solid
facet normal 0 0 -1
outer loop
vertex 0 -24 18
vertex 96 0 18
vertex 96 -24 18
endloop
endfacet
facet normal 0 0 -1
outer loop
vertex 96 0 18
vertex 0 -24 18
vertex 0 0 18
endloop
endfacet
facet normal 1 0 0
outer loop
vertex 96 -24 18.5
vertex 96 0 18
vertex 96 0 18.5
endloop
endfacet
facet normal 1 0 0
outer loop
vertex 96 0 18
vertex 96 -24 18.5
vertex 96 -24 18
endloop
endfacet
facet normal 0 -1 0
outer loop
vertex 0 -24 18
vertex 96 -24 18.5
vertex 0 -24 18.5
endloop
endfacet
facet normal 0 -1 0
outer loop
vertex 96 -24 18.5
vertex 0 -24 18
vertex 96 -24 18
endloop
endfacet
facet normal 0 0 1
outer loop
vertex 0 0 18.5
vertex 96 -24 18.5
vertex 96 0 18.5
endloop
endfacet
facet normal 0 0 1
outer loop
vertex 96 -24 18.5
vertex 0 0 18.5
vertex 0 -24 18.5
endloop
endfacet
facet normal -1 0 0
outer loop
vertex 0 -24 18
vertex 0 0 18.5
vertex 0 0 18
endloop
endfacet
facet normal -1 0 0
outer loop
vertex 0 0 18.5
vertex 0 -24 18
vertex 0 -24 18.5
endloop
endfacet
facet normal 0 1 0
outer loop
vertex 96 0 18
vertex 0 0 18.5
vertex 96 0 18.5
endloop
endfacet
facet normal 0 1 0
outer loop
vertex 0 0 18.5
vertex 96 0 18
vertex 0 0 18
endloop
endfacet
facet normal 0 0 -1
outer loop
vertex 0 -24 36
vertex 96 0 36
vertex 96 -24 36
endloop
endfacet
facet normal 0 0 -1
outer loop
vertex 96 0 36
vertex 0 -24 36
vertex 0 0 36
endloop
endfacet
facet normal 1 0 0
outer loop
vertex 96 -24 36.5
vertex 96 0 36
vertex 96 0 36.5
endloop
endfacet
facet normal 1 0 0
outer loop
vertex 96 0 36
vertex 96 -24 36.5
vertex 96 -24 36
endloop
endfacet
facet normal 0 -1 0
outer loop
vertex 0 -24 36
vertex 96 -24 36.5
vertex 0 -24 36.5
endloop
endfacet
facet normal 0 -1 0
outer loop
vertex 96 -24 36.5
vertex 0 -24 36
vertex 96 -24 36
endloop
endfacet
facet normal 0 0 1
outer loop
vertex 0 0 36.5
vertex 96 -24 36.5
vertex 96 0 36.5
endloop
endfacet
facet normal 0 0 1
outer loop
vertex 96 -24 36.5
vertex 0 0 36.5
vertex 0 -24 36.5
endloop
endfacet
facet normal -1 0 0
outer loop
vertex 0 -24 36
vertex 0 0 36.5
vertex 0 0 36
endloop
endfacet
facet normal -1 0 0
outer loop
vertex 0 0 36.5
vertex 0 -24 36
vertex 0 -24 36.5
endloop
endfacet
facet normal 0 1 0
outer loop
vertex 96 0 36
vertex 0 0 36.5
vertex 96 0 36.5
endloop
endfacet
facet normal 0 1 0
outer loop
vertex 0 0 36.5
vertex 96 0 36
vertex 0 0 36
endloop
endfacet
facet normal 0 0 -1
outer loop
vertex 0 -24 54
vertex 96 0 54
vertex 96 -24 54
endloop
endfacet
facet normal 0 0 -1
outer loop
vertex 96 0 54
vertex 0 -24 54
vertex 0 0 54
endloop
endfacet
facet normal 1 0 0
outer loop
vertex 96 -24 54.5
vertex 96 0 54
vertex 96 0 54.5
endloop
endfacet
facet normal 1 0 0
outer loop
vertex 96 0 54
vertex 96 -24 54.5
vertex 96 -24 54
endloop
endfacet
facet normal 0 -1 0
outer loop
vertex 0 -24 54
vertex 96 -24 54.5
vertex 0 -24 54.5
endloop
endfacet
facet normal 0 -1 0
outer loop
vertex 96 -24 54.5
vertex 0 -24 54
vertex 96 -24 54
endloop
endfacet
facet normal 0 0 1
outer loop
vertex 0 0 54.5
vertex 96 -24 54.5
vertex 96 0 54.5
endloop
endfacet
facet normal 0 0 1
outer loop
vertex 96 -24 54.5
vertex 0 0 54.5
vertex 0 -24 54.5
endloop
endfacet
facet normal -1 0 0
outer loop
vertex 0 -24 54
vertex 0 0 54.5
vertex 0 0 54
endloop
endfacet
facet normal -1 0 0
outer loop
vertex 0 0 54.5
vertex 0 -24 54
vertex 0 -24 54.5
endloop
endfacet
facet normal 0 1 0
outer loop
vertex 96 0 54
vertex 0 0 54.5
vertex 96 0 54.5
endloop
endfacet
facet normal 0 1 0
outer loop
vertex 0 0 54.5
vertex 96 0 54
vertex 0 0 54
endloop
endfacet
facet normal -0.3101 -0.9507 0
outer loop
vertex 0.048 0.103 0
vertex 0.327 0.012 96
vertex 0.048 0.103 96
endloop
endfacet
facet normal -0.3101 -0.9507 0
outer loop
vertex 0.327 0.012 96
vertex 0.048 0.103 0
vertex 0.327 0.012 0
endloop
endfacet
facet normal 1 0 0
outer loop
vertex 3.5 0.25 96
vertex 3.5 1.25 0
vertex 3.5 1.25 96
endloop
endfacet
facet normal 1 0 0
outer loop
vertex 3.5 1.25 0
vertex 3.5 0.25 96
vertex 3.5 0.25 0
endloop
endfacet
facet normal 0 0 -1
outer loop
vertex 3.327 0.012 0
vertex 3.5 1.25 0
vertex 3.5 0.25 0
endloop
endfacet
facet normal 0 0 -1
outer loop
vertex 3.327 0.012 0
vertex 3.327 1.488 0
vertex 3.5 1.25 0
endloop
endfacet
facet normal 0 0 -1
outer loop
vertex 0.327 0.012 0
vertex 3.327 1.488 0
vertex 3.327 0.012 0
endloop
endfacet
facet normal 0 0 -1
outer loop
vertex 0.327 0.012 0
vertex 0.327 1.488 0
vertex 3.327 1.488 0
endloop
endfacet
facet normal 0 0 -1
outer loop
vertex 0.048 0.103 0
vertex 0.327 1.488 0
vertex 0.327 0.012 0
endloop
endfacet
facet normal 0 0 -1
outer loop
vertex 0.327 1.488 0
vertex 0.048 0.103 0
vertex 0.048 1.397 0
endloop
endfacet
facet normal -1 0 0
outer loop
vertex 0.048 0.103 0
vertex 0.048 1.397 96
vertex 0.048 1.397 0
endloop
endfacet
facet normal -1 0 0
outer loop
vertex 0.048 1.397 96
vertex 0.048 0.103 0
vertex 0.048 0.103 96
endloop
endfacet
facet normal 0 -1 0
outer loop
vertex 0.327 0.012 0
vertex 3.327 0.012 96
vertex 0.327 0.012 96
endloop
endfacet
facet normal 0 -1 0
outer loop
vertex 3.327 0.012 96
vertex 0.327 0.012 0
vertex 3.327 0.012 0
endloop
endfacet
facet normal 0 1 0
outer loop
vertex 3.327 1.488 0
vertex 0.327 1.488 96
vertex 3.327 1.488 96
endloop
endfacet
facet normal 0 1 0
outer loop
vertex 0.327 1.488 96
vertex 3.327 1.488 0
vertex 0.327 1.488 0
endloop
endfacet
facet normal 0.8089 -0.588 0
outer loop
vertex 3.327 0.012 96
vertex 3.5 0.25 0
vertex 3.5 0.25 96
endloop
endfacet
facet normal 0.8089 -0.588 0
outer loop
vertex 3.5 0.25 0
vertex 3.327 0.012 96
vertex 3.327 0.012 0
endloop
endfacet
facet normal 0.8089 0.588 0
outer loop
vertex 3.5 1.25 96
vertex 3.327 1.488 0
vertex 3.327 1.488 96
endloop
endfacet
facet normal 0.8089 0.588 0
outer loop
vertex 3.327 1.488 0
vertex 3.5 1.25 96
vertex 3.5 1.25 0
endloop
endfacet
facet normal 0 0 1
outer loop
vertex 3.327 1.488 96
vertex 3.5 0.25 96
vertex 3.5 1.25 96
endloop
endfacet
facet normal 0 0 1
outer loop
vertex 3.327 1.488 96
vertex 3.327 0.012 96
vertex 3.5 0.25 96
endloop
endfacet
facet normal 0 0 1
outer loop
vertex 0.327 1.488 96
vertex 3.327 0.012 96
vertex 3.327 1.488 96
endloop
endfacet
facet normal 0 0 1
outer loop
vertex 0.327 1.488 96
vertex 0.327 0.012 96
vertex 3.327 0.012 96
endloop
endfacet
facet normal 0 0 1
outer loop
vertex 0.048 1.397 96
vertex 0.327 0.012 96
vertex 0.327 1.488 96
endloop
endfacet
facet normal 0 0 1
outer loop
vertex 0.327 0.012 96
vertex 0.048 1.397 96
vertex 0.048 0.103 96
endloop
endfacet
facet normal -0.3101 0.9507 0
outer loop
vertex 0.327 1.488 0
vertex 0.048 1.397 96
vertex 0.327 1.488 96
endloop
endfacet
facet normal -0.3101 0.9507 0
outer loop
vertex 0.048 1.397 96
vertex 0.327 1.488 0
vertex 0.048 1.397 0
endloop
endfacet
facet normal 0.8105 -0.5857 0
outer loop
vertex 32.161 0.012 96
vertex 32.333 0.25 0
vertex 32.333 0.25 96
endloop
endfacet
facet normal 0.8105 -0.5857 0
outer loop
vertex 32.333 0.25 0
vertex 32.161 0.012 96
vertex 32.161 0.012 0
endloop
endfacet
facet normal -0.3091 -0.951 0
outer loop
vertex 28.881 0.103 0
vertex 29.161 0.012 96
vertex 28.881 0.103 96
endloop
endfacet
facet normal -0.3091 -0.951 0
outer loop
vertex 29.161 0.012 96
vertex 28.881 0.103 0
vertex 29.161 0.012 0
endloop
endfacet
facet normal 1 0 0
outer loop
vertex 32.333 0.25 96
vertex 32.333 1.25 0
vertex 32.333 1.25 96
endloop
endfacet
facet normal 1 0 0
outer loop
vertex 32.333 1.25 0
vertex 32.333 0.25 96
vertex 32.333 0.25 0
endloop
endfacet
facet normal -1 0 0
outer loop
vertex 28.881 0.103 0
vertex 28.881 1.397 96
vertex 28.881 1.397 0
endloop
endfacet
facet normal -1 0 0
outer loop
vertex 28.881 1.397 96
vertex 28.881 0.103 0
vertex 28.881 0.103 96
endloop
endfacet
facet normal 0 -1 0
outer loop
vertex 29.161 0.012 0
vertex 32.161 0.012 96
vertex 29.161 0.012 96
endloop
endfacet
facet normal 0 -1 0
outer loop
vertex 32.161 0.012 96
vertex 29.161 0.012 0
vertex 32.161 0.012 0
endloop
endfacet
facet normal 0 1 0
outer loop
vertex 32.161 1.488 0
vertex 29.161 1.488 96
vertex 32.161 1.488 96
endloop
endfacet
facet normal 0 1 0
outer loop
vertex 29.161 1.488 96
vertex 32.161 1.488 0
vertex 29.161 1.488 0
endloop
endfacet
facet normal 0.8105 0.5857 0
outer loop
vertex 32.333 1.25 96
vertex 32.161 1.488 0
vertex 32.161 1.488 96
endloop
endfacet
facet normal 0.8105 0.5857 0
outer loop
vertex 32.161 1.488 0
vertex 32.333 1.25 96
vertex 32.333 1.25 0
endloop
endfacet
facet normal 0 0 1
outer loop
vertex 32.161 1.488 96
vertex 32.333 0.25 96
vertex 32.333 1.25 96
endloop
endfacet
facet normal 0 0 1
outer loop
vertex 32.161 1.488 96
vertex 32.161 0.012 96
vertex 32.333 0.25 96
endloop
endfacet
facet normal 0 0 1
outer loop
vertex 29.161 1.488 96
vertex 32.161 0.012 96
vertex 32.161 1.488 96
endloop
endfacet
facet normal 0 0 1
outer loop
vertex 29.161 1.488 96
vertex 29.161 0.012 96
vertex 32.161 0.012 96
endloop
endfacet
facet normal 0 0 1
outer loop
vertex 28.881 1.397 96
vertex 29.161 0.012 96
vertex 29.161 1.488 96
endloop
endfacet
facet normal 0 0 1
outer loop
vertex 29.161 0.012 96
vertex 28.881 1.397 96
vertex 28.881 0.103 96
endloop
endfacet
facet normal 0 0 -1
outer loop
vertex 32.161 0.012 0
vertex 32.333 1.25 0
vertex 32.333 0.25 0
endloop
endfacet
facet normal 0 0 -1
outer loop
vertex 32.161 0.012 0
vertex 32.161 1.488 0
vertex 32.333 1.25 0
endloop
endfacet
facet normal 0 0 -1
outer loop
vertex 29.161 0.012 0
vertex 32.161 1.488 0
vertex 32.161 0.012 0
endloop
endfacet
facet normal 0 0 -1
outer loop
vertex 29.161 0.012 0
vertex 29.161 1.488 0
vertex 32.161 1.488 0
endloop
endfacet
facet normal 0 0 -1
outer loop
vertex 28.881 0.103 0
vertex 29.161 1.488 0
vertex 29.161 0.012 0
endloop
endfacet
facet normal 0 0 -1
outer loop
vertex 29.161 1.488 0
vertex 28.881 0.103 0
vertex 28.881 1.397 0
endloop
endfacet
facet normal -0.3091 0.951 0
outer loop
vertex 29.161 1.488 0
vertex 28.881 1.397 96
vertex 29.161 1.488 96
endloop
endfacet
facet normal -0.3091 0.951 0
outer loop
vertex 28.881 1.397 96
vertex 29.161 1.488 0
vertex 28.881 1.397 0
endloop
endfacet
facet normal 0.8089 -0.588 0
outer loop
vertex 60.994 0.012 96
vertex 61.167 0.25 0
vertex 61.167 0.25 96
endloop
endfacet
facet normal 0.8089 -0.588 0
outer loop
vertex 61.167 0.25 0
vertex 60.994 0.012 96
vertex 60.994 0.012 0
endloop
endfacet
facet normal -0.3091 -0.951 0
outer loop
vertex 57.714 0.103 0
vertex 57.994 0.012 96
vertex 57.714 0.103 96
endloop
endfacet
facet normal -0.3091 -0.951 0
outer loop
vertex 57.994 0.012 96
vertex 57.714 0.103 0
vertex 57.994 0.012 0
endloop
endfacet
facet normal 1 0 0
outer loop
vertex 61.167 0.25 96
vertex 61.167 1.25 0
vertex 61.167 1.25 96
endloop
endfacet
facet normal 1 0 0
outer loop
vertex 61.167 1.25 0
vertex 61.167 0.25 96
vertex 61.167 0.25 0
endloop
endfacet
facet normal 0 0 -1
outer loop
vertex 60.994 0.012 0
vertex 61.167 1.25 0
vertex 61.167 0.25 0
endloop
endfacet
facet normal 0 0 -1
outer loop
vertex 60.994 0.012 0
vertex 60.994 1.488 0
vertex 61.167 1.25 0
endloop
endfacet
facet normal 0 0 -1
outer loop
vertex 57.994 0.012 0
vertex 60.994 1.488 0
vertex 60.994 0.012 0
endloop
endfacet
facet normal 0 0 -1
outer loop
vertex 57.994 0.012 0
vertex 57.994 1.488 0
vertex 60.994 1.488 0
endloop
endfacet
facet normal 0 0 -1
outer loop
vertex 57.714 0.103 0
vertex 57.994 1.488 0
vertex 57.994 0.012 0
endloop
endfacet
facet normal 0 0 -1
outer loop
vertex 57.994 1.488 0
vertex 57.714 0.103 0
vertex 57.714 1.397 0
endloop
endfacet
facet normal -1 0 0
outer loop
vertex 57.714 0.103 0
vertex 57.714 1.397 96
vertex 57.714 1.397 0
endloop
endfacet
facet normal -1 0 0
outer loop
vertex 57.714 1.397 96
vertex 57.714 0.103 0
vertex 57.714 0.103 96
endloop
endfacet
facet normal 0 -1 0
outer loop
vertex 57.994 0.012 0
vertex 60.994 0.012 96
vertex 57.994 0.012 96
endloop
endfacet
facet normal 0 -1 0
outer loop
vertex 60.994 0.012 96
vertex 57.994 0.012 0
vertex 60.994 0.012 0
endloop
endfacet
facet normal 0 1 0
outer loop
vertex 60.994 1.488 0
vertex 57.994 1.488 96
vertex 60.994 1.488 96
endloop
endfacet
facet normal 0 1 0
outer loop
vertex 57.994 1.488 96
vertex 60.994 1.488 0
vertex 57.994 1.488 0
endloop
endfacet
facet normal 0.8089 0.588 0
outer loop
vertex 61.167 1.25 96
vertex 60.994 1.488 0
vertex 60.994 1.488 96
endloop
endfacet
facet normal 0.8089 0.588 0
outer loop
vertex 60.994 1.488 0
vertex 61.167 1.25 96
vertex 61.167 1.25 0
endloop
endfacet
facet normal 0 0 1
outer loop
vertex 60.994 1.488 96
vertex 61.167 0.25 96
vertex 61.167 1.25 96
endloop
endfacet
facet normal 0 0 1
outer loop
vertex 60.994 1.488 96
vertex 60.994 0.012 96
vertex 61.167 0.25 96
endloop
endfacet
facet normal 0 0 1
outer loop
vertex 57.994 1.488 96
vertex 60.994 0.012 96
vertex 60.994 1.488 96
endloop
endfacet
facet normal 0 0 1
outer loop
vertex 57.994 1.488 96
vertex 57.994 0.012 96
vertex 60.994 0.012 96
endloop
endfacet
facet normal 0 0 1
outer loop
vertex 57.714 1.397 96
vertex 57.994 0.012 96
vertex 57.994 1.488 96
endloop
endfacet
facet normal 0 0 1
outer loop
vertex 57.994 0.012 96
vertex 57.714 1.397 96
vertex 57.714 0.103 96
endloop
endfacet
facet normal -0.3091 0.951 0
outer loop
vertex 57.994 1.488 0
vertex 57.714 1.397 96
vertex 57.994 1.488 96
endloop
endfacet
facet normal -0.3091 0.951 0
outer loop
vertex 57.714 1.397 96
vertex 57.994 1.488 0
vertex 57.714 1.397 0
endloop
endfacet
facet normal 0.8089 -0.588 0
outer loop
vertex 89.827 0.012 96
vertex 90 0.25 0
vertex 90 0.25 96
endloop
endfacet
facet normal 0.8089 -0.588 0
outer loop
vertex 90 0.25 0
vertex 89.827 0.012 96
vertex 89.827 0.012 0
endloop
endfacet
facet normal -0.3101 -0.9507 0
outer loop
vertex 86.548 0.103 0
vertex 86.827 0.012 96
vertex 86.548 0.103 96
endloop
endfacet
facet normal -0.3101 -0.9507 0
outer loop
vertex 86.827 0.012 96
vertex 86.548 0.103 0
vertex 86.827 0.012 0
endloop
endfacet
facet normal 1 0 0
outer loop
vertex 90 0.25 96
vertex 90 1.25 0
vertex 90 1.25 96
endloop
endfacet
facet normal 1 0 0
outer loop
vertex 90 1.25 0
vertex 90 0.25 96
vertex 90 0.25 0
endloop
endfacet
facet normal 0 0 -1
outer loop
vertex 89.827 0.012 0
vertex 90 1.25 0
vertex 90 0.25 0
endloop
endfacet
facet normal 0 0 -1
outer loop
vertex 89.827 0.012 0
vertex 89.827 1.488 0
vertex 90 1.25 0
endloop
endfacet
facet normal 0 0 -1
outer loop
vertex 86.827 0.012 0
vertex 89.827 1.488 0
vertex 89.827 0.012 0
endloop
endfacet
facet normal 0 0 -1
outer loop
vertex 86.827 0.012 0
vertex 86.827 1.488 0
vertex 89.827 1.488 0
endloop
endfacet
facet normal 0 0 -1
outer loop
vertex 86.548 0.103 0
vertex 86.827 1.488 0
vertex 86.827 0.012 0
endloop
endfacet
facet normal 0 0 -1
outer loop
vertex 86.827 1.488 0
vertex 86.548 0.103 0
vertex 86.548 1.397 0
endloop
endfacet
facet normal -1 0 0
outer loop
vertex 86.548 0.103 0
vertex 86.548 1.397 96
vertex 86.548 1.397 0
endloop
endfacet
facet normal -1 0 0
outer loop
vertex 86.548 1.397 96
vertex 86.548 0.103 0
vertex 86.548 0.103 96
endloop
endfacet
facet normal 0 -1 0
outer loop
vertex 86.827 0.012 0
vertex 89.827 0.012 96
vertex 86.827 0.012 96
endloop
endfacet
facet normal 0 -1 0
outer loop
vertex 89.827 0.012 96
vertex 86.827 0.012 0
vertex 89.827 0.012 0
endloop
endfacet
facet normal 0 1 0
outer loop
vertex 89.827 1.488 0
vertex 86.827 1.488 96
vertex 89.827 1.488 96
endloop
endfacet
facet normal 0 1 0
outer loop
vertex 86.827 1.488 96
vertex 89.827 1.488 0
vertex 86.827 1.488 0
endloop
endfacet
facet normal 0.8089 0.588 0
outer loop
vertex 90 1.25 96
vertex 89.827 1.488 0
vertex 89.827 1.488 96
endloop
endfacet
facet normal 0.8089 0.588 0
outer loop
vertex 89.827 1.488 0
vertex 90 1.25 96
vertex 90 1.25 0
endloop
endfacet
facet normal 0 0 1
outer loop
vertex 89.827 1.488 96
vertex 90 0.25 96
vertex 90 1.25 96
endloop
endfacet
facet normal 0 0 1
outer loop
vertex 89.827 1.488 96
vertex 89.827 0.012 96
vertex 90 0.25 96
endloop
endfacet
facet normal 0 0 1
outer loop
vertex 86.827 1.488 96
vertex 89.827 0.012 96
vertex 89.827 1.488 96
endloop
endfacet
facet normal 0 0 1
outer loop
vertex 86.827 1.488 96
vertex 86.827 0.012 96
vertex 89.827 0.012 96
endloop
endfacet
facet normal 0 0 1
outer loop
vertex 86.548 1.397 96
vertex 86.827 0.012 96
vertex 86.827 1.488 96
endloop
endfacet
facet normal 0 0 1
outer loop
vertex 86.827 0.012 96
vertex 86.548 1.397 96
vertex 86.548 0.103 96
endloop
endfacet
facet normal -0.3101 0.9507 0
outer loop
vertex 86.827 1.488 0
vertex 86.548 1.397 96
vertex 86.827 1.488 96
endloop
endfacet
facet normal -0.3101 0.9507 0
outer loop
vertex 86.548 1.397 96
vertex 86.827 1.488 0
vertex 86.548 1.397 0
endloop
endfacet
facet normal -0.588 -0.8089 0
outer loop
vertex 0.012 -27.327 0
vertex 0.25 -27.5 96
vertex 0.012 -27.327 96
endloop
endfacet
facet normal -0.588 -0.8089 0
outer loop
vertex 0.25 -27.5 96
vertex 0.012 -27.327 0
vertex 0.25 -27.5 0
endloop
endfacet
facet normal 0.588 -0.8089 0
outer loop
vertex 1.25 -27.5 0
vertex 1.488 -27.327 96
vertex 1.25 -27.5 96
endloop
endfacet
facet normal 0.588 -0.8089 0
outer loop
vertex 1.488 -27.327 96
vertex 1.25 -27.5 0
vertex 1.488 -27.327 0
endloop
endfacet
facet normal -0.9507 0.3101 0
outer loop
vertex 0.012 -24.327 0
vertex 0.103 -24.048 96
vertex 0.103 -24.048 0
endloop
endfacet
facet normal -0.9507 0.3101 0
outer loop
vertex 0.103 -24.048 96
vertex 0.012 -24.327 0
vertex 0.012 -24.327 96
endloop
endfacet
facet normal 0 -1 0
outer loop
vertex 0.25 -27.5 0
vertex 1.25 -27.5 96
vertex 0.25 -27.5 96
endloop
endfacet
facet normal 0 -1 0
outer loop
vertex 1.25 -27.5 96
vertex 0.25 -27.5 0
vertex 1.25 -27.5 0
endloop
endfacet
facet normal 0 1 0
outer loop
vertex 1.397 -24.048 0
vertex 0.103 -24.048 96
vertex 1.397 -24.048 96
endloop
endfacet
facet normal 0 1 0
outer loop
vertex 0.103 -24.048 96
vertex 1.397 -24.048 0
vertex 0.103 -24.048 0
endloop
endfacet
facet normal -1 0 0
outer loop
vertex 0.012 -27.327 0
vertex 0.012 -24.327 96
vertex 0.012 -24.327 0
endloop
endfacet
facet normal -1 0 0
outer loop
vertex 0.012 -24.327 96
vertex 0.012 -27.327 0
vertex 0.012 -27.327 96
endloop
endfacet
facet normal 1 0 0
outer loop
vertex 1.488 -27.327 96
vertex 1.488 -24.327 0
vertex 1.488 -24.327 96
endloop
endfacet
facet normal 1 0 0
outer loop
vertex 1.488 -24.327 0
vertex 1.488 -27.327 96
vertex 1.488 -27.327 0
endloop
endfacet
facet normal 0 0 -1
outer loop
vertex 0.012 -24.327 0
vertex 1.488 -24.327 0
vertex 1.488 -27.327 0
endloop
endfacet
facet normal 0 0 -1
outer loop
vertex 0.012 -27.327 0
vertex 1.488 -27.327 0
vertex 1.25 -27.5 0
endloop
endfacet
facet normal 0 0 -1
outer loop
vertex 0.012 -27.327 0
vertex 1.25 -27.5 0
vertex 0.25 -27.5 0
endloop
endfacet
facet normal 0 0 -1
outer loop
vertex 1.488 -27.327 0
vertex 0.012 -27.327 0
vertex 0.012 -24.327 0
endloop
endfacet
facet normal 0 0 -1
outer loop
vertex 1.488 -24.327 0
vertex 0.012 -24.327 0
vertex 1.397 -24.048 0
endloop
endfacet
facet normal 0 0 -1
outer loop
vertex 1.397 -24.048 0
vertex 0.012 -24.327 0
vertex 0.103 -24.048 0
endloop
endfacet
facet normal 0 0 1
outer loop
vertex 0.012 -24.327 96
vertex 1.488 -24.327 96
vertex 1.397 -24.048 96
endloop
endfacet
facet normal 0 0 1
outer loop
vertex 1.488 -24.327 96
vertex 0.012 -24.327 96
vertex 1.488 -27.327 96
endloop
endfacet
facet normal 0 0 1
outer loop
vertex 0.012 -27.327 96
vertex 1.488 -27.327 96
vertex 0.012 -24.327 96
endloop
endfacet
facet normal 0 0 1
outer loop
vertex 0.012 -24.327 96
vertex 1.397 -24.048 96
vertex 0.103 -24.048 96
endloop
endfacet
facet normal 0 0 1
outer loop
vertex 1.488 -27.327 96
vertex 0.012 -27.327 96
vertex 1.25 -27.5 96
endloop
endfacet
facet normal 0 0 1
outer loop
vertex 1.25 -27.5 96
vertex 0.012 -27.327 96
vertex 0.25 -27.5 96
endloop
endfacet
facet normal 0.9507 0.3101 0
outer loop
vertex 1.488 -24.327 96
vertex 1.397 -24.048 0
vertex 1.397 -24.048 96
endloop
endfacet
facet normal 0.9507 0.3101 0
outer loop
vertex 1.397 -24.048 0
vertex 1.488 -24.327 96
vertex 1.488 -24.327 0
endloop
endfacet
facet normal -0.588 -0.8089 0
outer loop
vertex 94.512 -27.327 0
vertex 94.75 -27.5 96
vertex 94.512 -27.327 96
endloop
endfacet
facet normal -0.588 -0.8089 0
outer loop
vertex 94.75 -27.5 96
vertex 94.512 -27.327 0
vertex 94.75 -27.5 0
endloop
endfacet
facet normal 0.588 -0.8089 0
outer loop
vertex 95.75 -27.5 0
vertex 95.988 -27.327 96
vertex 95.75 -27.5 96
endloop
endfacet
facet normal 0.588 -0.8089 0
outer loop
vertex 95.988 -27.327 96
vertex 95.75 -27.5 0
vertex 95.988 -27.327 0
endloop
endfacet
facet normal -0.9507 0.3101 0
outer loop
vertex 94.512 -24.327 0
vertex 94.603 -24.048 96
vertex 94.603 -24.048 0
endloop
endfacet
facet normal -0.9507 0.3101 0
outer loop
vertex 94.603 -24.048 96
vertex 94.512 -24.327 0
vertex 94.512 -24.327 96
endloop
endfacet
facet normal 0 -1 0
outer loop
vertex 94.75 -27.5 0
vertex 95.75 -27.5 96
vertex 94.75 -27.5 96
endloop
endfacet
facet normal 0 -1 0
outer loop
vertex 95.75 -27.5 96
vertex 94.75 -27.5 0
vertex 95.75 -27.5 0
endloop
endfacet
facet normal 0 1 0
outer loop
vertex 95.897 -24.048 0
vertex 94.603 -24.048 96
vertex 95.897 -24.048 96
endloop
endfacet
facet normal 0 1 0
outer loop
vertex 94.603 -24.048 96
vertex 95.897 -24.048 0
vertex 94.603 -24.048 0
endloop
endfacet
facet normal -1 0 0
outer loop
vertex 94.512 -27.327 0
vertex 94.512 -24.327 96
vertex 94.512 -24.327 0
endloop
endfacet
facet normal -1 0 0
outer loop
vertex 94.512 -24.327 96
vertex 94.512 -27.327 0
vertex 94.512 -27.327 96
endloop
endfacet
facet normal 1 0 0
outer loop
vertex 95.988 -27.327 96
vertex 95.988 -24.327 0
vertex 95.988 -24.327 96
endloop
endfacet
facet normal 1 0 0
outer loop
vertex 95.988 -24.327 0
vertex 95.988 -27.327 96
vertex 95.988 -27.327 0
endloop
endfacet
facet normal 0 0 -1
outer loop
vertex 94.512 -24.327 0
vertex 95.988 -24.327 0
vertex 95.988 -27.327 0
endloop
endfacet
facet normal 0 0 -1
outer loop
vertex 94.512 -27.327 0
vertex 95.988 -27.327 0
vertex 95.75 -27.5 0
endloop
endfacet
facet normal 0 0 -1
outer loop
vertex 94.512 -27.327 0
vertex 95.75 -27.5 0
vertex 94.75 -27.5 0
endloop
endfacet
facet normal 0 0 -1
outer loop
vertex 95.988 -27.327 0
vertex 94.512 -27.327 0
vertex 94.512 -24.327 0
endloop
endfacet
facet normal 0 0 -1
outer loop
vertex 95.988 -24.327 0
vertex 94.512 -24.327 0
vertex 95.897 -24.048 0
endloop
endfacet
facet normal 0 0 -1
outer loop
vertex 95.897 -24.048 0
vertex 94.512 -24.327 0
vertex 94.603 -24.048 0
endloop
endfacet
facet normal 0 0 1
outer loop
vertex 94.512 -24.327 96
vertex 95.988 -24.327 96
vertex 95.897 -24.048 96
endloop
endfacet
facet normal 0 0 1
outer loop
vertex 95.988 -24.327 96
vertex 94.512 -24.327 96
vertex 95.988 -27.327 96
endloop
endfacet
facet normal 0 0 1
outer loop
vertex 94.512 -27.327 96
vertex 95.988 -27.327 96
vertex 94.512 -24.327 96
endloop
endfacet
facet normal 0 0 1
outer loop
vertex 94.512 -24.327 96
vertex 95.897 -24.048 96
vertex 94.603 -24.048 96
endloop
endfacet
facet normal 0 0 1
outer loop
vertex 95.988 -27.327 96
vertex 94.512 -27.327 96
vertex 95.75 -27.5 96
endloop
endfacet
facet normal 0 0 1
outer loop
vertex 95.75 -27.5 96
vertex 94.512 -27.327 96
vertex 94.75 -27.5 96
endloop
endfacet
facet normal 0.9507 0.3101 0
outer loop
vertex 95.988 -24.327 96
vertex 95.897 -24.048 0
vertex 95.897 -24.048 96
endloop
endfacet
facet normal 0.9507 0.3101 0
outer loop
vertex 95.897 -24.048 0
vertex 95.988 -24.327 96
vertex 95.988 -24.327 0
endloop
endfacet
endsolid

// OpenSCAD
// file: lumber.scad
TWO_BY = 1.5;
SIX_BY = 5.5;
FOUR_BY = 3.5;

module rounded_box(points, radius, height){
    hull(){
        for (p = points){
            translate(p) cylinder(r=radius, h=height);
        }
    }
}

module board(x = 0, y = 0, z = 0) {
  radius = 0.25;
  points = [
    [0 + radius, 0 + radius, 0],
    [x - radius, 0 + radius, 0],
    [0 + radius, y - radius, 0],
    [x - radius, y - radius, 0]
  ];
  rounded_box(points, radius, z);
}

module two_by_four(length = 0) {
  board(FOUR_BY, TWO_BY, length);
}

module two_by_six(length = 0) {
  board(SIX_BY, TWO_BY, length);
}

module four_by_four(length = 0) {
  board(FOUR_BY, FOUR_BY, length);
}
// file: shelf.scad
module plywood(w = 0, d = 0, h = .5) {
  linear_extrude(height = h) {
    polygon(points = [[0, 0], [w, 0], [w, -1 * d], [0, -1 * d]]);
  }
}

module shelf_at(height = 0) {
  translate([0, 0, height]) {
    plywood(width, depth);
  }
}

small_shelf_height = 18;
num_small_shelves = 3;
for (i = [1 : num_small_shelves]) {
  echo(i);
  shelf_at(small_shelf_height * i);
}
// file: supports.scad
include <lumber.scad>

module twobyfour() {
  two_by_four(height);
}

module flattwobyfour() {
  rotate(-90)
  two_by_four(height);
}

numtwobyfours = 4;
gaps = numtwobyfours - 1;
gapbetween = (width - (numtwobyfours * 3.5)) / (gaps);

function twobyfourstartpos(num = 0) = gapbetween * num + (TWO_BY * num);

twobyfour();

translate([twobyfourstartpos(1),0,0])
twobyfour();

translate([twobyfourstartpos(2),0,0])
twobyfour();


translate([twobyfourstartpos(3),0,0])
twobyfour();

translate([0, -1 * depth, 0])
flattwobyfour();

translate([width - 1.5, -1 * depth, 0])
flattwobyfour();
// main file
height = 96;
width = 96;
depth = 24;

include <supports.scad>

include <shelf.scad>
